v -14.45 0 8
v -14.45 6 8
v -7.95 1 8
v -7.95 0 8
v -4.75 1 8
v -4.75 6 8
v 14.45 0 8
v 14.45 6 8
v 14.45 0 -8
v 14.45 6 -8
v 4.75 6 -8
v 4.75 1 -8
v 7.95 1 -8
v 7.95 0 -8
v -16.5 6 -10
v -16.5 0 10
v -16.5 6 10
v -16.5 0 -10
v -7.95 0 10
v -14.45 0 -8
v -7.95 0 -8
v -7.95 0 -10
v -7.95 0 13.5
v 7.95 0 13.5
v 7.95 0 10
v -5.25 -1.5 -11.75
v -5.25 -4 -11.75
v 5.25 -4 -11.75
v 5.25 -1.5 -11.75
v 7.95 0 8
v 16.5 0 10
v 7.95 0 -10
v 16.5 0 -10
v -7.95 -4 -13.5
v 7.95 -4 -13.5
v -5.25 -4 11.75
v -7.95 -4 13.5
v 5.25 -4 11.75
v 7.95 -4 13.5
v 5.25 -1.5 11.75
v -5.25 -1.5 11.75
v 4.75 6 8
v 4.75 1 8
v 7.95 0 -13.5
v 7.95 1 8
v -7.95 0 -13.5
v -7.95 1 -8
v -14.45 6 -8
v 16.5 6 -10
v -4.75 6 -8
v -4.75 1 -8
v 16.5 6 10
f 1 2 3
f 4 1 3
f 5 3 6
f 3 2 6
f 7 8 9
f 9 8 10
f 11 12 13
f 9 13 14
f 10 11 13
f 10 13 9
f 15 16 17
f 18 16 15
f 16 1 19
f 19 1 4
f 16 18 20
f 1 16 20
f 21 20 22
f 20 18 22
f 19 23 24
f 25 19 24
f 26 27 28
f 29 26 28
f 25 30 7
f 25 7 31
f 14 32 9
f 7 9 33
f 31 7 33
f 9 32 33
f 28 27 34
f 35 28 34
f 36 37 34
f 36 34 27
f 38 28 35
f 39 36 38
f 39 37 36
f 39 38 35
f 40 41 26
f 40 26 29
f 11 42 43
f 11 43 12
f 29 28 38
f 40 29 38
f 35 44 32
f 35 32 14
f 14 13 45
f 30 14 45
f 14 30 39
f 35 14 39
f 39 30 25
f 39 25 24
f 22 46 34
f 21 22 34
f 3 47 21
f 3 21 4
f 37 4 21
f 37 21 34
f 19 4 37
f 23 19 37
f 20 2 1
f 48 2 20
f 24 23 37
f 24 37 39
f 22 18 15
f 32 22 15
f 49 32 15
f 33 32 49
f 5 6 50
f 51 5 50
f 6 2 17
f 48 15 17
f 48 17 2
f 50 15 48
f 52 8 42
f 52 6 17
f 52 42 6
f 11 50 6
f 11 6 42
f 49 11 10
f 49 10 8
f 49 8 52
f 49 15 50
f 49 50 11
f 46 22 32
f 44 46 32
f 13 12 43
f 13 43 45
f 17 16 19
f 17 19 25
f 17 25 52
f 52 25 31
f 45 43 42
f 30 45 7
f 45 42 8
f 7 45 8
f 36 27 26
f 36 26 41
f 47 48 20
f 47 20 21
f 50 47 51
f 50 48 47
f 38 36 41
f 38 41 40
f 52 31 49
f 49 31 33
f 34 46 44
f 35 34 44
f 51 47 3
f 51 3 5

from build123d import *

# Parameters (mm, degrees)
SZKIC1_W                    = 33
SZKIC1_H                    = 20
DODANIE_WYCI_GNI_CIE1_DEPTH = 6
SZKIC2_W                    = 9.7
SZKIC2_H                    = 16
WYTNIJ_WYCI_GNI_CIE1_DEPTH  = 5
SZKIC2_4_W                  = 6.5
SZKIC2_4_H                  = 16
WYTNIJ_WYCI_GNI_CIE2_DEPTH  = 21.205197351
SZKIC3_W                    = 15.9
SZKIC3_H                    = 27
DODANIE_WYCI_GNI_CIE2_DEPTH = 4
SZKIC4_W                    = 10.5
SZKIC4_H                    = 23.5
WYTNIJ_WYCI_GNI_CIE3_DEPTH  = 2.5


with BuildPart() as part:
    # Szkic1 → Dodanie-wyciągnięcie1 (new body)
    with BuildSketch(Plane(origin=(0, 0, 0), x_dir=(1, 0, 0), z_dir=(0, 1, 0))):
        Rectangle(SZKIC1_W, SZKIC1_H)
    extrude(amount=DODANIE_WYCI_GNI_CIE1_DEPTH)

    # Szkic2 → Wytnij-wyciągnięcie1 (cut)
    with BuildSketch(Plane(origin=(0, 6, 0), x_dir=(1, 0, 0), z_dir=(0, 1, 0))):
        with Locations((-9.6, 0)):
            Rectangle(SZKIC2_W, SZKIC2_H)
        with Locations((9.6, 0)):
            Rectangle(SZKIC2_W, SZKIC2_H)
    extrude(amount=-WYTNIJ_WYCI_GNI_CIE1_DEPTH, mode=Mode.SUBTRACT)

    # Szkic2<4> → Wytnij-wyciągnięcie2 (cut, through all)
    with BuildSketch(Plane(origin=(0, 6, 0), x_dir=(1, 0, 0), z_dir=(0, 1, 0))):
        with Locations((-11.2, 0)):
            Rectangle(SZKIC2_4_W, SZKIC2_4_H)
        with Locations((11.2, 0)):
            Rectangle(SZKIC2_4_W, SZKIC2_4_H)
    extrude(amount=-WYTNIJ_WYCI_GNI_CIE2_DEPTH, mode=Mode.SUBTRACT)

    # Szkic3 → Dodanie-wyciągnięcie2 (add)
    with BuildSketch(Plane.XZ):
        Rectangle(SZKIC3_W, SZKIC3_H)
    extrude(amount=DODANIE_WYCI_GNI_CIE2_DEPTH)

    # Szkic4 → Wytnij-wyciągnięcie3 (cut)
    with BuildSketch(Plane.XZ.offset(4)):
        Rectangle(SZKIC4_W, SZKIC4_H)
    extrude(amount=-WYTNIJ_WYCI_GNI_CIE3_DEPTH, mode=Mode.SUBTRACT)


solid = part.part
